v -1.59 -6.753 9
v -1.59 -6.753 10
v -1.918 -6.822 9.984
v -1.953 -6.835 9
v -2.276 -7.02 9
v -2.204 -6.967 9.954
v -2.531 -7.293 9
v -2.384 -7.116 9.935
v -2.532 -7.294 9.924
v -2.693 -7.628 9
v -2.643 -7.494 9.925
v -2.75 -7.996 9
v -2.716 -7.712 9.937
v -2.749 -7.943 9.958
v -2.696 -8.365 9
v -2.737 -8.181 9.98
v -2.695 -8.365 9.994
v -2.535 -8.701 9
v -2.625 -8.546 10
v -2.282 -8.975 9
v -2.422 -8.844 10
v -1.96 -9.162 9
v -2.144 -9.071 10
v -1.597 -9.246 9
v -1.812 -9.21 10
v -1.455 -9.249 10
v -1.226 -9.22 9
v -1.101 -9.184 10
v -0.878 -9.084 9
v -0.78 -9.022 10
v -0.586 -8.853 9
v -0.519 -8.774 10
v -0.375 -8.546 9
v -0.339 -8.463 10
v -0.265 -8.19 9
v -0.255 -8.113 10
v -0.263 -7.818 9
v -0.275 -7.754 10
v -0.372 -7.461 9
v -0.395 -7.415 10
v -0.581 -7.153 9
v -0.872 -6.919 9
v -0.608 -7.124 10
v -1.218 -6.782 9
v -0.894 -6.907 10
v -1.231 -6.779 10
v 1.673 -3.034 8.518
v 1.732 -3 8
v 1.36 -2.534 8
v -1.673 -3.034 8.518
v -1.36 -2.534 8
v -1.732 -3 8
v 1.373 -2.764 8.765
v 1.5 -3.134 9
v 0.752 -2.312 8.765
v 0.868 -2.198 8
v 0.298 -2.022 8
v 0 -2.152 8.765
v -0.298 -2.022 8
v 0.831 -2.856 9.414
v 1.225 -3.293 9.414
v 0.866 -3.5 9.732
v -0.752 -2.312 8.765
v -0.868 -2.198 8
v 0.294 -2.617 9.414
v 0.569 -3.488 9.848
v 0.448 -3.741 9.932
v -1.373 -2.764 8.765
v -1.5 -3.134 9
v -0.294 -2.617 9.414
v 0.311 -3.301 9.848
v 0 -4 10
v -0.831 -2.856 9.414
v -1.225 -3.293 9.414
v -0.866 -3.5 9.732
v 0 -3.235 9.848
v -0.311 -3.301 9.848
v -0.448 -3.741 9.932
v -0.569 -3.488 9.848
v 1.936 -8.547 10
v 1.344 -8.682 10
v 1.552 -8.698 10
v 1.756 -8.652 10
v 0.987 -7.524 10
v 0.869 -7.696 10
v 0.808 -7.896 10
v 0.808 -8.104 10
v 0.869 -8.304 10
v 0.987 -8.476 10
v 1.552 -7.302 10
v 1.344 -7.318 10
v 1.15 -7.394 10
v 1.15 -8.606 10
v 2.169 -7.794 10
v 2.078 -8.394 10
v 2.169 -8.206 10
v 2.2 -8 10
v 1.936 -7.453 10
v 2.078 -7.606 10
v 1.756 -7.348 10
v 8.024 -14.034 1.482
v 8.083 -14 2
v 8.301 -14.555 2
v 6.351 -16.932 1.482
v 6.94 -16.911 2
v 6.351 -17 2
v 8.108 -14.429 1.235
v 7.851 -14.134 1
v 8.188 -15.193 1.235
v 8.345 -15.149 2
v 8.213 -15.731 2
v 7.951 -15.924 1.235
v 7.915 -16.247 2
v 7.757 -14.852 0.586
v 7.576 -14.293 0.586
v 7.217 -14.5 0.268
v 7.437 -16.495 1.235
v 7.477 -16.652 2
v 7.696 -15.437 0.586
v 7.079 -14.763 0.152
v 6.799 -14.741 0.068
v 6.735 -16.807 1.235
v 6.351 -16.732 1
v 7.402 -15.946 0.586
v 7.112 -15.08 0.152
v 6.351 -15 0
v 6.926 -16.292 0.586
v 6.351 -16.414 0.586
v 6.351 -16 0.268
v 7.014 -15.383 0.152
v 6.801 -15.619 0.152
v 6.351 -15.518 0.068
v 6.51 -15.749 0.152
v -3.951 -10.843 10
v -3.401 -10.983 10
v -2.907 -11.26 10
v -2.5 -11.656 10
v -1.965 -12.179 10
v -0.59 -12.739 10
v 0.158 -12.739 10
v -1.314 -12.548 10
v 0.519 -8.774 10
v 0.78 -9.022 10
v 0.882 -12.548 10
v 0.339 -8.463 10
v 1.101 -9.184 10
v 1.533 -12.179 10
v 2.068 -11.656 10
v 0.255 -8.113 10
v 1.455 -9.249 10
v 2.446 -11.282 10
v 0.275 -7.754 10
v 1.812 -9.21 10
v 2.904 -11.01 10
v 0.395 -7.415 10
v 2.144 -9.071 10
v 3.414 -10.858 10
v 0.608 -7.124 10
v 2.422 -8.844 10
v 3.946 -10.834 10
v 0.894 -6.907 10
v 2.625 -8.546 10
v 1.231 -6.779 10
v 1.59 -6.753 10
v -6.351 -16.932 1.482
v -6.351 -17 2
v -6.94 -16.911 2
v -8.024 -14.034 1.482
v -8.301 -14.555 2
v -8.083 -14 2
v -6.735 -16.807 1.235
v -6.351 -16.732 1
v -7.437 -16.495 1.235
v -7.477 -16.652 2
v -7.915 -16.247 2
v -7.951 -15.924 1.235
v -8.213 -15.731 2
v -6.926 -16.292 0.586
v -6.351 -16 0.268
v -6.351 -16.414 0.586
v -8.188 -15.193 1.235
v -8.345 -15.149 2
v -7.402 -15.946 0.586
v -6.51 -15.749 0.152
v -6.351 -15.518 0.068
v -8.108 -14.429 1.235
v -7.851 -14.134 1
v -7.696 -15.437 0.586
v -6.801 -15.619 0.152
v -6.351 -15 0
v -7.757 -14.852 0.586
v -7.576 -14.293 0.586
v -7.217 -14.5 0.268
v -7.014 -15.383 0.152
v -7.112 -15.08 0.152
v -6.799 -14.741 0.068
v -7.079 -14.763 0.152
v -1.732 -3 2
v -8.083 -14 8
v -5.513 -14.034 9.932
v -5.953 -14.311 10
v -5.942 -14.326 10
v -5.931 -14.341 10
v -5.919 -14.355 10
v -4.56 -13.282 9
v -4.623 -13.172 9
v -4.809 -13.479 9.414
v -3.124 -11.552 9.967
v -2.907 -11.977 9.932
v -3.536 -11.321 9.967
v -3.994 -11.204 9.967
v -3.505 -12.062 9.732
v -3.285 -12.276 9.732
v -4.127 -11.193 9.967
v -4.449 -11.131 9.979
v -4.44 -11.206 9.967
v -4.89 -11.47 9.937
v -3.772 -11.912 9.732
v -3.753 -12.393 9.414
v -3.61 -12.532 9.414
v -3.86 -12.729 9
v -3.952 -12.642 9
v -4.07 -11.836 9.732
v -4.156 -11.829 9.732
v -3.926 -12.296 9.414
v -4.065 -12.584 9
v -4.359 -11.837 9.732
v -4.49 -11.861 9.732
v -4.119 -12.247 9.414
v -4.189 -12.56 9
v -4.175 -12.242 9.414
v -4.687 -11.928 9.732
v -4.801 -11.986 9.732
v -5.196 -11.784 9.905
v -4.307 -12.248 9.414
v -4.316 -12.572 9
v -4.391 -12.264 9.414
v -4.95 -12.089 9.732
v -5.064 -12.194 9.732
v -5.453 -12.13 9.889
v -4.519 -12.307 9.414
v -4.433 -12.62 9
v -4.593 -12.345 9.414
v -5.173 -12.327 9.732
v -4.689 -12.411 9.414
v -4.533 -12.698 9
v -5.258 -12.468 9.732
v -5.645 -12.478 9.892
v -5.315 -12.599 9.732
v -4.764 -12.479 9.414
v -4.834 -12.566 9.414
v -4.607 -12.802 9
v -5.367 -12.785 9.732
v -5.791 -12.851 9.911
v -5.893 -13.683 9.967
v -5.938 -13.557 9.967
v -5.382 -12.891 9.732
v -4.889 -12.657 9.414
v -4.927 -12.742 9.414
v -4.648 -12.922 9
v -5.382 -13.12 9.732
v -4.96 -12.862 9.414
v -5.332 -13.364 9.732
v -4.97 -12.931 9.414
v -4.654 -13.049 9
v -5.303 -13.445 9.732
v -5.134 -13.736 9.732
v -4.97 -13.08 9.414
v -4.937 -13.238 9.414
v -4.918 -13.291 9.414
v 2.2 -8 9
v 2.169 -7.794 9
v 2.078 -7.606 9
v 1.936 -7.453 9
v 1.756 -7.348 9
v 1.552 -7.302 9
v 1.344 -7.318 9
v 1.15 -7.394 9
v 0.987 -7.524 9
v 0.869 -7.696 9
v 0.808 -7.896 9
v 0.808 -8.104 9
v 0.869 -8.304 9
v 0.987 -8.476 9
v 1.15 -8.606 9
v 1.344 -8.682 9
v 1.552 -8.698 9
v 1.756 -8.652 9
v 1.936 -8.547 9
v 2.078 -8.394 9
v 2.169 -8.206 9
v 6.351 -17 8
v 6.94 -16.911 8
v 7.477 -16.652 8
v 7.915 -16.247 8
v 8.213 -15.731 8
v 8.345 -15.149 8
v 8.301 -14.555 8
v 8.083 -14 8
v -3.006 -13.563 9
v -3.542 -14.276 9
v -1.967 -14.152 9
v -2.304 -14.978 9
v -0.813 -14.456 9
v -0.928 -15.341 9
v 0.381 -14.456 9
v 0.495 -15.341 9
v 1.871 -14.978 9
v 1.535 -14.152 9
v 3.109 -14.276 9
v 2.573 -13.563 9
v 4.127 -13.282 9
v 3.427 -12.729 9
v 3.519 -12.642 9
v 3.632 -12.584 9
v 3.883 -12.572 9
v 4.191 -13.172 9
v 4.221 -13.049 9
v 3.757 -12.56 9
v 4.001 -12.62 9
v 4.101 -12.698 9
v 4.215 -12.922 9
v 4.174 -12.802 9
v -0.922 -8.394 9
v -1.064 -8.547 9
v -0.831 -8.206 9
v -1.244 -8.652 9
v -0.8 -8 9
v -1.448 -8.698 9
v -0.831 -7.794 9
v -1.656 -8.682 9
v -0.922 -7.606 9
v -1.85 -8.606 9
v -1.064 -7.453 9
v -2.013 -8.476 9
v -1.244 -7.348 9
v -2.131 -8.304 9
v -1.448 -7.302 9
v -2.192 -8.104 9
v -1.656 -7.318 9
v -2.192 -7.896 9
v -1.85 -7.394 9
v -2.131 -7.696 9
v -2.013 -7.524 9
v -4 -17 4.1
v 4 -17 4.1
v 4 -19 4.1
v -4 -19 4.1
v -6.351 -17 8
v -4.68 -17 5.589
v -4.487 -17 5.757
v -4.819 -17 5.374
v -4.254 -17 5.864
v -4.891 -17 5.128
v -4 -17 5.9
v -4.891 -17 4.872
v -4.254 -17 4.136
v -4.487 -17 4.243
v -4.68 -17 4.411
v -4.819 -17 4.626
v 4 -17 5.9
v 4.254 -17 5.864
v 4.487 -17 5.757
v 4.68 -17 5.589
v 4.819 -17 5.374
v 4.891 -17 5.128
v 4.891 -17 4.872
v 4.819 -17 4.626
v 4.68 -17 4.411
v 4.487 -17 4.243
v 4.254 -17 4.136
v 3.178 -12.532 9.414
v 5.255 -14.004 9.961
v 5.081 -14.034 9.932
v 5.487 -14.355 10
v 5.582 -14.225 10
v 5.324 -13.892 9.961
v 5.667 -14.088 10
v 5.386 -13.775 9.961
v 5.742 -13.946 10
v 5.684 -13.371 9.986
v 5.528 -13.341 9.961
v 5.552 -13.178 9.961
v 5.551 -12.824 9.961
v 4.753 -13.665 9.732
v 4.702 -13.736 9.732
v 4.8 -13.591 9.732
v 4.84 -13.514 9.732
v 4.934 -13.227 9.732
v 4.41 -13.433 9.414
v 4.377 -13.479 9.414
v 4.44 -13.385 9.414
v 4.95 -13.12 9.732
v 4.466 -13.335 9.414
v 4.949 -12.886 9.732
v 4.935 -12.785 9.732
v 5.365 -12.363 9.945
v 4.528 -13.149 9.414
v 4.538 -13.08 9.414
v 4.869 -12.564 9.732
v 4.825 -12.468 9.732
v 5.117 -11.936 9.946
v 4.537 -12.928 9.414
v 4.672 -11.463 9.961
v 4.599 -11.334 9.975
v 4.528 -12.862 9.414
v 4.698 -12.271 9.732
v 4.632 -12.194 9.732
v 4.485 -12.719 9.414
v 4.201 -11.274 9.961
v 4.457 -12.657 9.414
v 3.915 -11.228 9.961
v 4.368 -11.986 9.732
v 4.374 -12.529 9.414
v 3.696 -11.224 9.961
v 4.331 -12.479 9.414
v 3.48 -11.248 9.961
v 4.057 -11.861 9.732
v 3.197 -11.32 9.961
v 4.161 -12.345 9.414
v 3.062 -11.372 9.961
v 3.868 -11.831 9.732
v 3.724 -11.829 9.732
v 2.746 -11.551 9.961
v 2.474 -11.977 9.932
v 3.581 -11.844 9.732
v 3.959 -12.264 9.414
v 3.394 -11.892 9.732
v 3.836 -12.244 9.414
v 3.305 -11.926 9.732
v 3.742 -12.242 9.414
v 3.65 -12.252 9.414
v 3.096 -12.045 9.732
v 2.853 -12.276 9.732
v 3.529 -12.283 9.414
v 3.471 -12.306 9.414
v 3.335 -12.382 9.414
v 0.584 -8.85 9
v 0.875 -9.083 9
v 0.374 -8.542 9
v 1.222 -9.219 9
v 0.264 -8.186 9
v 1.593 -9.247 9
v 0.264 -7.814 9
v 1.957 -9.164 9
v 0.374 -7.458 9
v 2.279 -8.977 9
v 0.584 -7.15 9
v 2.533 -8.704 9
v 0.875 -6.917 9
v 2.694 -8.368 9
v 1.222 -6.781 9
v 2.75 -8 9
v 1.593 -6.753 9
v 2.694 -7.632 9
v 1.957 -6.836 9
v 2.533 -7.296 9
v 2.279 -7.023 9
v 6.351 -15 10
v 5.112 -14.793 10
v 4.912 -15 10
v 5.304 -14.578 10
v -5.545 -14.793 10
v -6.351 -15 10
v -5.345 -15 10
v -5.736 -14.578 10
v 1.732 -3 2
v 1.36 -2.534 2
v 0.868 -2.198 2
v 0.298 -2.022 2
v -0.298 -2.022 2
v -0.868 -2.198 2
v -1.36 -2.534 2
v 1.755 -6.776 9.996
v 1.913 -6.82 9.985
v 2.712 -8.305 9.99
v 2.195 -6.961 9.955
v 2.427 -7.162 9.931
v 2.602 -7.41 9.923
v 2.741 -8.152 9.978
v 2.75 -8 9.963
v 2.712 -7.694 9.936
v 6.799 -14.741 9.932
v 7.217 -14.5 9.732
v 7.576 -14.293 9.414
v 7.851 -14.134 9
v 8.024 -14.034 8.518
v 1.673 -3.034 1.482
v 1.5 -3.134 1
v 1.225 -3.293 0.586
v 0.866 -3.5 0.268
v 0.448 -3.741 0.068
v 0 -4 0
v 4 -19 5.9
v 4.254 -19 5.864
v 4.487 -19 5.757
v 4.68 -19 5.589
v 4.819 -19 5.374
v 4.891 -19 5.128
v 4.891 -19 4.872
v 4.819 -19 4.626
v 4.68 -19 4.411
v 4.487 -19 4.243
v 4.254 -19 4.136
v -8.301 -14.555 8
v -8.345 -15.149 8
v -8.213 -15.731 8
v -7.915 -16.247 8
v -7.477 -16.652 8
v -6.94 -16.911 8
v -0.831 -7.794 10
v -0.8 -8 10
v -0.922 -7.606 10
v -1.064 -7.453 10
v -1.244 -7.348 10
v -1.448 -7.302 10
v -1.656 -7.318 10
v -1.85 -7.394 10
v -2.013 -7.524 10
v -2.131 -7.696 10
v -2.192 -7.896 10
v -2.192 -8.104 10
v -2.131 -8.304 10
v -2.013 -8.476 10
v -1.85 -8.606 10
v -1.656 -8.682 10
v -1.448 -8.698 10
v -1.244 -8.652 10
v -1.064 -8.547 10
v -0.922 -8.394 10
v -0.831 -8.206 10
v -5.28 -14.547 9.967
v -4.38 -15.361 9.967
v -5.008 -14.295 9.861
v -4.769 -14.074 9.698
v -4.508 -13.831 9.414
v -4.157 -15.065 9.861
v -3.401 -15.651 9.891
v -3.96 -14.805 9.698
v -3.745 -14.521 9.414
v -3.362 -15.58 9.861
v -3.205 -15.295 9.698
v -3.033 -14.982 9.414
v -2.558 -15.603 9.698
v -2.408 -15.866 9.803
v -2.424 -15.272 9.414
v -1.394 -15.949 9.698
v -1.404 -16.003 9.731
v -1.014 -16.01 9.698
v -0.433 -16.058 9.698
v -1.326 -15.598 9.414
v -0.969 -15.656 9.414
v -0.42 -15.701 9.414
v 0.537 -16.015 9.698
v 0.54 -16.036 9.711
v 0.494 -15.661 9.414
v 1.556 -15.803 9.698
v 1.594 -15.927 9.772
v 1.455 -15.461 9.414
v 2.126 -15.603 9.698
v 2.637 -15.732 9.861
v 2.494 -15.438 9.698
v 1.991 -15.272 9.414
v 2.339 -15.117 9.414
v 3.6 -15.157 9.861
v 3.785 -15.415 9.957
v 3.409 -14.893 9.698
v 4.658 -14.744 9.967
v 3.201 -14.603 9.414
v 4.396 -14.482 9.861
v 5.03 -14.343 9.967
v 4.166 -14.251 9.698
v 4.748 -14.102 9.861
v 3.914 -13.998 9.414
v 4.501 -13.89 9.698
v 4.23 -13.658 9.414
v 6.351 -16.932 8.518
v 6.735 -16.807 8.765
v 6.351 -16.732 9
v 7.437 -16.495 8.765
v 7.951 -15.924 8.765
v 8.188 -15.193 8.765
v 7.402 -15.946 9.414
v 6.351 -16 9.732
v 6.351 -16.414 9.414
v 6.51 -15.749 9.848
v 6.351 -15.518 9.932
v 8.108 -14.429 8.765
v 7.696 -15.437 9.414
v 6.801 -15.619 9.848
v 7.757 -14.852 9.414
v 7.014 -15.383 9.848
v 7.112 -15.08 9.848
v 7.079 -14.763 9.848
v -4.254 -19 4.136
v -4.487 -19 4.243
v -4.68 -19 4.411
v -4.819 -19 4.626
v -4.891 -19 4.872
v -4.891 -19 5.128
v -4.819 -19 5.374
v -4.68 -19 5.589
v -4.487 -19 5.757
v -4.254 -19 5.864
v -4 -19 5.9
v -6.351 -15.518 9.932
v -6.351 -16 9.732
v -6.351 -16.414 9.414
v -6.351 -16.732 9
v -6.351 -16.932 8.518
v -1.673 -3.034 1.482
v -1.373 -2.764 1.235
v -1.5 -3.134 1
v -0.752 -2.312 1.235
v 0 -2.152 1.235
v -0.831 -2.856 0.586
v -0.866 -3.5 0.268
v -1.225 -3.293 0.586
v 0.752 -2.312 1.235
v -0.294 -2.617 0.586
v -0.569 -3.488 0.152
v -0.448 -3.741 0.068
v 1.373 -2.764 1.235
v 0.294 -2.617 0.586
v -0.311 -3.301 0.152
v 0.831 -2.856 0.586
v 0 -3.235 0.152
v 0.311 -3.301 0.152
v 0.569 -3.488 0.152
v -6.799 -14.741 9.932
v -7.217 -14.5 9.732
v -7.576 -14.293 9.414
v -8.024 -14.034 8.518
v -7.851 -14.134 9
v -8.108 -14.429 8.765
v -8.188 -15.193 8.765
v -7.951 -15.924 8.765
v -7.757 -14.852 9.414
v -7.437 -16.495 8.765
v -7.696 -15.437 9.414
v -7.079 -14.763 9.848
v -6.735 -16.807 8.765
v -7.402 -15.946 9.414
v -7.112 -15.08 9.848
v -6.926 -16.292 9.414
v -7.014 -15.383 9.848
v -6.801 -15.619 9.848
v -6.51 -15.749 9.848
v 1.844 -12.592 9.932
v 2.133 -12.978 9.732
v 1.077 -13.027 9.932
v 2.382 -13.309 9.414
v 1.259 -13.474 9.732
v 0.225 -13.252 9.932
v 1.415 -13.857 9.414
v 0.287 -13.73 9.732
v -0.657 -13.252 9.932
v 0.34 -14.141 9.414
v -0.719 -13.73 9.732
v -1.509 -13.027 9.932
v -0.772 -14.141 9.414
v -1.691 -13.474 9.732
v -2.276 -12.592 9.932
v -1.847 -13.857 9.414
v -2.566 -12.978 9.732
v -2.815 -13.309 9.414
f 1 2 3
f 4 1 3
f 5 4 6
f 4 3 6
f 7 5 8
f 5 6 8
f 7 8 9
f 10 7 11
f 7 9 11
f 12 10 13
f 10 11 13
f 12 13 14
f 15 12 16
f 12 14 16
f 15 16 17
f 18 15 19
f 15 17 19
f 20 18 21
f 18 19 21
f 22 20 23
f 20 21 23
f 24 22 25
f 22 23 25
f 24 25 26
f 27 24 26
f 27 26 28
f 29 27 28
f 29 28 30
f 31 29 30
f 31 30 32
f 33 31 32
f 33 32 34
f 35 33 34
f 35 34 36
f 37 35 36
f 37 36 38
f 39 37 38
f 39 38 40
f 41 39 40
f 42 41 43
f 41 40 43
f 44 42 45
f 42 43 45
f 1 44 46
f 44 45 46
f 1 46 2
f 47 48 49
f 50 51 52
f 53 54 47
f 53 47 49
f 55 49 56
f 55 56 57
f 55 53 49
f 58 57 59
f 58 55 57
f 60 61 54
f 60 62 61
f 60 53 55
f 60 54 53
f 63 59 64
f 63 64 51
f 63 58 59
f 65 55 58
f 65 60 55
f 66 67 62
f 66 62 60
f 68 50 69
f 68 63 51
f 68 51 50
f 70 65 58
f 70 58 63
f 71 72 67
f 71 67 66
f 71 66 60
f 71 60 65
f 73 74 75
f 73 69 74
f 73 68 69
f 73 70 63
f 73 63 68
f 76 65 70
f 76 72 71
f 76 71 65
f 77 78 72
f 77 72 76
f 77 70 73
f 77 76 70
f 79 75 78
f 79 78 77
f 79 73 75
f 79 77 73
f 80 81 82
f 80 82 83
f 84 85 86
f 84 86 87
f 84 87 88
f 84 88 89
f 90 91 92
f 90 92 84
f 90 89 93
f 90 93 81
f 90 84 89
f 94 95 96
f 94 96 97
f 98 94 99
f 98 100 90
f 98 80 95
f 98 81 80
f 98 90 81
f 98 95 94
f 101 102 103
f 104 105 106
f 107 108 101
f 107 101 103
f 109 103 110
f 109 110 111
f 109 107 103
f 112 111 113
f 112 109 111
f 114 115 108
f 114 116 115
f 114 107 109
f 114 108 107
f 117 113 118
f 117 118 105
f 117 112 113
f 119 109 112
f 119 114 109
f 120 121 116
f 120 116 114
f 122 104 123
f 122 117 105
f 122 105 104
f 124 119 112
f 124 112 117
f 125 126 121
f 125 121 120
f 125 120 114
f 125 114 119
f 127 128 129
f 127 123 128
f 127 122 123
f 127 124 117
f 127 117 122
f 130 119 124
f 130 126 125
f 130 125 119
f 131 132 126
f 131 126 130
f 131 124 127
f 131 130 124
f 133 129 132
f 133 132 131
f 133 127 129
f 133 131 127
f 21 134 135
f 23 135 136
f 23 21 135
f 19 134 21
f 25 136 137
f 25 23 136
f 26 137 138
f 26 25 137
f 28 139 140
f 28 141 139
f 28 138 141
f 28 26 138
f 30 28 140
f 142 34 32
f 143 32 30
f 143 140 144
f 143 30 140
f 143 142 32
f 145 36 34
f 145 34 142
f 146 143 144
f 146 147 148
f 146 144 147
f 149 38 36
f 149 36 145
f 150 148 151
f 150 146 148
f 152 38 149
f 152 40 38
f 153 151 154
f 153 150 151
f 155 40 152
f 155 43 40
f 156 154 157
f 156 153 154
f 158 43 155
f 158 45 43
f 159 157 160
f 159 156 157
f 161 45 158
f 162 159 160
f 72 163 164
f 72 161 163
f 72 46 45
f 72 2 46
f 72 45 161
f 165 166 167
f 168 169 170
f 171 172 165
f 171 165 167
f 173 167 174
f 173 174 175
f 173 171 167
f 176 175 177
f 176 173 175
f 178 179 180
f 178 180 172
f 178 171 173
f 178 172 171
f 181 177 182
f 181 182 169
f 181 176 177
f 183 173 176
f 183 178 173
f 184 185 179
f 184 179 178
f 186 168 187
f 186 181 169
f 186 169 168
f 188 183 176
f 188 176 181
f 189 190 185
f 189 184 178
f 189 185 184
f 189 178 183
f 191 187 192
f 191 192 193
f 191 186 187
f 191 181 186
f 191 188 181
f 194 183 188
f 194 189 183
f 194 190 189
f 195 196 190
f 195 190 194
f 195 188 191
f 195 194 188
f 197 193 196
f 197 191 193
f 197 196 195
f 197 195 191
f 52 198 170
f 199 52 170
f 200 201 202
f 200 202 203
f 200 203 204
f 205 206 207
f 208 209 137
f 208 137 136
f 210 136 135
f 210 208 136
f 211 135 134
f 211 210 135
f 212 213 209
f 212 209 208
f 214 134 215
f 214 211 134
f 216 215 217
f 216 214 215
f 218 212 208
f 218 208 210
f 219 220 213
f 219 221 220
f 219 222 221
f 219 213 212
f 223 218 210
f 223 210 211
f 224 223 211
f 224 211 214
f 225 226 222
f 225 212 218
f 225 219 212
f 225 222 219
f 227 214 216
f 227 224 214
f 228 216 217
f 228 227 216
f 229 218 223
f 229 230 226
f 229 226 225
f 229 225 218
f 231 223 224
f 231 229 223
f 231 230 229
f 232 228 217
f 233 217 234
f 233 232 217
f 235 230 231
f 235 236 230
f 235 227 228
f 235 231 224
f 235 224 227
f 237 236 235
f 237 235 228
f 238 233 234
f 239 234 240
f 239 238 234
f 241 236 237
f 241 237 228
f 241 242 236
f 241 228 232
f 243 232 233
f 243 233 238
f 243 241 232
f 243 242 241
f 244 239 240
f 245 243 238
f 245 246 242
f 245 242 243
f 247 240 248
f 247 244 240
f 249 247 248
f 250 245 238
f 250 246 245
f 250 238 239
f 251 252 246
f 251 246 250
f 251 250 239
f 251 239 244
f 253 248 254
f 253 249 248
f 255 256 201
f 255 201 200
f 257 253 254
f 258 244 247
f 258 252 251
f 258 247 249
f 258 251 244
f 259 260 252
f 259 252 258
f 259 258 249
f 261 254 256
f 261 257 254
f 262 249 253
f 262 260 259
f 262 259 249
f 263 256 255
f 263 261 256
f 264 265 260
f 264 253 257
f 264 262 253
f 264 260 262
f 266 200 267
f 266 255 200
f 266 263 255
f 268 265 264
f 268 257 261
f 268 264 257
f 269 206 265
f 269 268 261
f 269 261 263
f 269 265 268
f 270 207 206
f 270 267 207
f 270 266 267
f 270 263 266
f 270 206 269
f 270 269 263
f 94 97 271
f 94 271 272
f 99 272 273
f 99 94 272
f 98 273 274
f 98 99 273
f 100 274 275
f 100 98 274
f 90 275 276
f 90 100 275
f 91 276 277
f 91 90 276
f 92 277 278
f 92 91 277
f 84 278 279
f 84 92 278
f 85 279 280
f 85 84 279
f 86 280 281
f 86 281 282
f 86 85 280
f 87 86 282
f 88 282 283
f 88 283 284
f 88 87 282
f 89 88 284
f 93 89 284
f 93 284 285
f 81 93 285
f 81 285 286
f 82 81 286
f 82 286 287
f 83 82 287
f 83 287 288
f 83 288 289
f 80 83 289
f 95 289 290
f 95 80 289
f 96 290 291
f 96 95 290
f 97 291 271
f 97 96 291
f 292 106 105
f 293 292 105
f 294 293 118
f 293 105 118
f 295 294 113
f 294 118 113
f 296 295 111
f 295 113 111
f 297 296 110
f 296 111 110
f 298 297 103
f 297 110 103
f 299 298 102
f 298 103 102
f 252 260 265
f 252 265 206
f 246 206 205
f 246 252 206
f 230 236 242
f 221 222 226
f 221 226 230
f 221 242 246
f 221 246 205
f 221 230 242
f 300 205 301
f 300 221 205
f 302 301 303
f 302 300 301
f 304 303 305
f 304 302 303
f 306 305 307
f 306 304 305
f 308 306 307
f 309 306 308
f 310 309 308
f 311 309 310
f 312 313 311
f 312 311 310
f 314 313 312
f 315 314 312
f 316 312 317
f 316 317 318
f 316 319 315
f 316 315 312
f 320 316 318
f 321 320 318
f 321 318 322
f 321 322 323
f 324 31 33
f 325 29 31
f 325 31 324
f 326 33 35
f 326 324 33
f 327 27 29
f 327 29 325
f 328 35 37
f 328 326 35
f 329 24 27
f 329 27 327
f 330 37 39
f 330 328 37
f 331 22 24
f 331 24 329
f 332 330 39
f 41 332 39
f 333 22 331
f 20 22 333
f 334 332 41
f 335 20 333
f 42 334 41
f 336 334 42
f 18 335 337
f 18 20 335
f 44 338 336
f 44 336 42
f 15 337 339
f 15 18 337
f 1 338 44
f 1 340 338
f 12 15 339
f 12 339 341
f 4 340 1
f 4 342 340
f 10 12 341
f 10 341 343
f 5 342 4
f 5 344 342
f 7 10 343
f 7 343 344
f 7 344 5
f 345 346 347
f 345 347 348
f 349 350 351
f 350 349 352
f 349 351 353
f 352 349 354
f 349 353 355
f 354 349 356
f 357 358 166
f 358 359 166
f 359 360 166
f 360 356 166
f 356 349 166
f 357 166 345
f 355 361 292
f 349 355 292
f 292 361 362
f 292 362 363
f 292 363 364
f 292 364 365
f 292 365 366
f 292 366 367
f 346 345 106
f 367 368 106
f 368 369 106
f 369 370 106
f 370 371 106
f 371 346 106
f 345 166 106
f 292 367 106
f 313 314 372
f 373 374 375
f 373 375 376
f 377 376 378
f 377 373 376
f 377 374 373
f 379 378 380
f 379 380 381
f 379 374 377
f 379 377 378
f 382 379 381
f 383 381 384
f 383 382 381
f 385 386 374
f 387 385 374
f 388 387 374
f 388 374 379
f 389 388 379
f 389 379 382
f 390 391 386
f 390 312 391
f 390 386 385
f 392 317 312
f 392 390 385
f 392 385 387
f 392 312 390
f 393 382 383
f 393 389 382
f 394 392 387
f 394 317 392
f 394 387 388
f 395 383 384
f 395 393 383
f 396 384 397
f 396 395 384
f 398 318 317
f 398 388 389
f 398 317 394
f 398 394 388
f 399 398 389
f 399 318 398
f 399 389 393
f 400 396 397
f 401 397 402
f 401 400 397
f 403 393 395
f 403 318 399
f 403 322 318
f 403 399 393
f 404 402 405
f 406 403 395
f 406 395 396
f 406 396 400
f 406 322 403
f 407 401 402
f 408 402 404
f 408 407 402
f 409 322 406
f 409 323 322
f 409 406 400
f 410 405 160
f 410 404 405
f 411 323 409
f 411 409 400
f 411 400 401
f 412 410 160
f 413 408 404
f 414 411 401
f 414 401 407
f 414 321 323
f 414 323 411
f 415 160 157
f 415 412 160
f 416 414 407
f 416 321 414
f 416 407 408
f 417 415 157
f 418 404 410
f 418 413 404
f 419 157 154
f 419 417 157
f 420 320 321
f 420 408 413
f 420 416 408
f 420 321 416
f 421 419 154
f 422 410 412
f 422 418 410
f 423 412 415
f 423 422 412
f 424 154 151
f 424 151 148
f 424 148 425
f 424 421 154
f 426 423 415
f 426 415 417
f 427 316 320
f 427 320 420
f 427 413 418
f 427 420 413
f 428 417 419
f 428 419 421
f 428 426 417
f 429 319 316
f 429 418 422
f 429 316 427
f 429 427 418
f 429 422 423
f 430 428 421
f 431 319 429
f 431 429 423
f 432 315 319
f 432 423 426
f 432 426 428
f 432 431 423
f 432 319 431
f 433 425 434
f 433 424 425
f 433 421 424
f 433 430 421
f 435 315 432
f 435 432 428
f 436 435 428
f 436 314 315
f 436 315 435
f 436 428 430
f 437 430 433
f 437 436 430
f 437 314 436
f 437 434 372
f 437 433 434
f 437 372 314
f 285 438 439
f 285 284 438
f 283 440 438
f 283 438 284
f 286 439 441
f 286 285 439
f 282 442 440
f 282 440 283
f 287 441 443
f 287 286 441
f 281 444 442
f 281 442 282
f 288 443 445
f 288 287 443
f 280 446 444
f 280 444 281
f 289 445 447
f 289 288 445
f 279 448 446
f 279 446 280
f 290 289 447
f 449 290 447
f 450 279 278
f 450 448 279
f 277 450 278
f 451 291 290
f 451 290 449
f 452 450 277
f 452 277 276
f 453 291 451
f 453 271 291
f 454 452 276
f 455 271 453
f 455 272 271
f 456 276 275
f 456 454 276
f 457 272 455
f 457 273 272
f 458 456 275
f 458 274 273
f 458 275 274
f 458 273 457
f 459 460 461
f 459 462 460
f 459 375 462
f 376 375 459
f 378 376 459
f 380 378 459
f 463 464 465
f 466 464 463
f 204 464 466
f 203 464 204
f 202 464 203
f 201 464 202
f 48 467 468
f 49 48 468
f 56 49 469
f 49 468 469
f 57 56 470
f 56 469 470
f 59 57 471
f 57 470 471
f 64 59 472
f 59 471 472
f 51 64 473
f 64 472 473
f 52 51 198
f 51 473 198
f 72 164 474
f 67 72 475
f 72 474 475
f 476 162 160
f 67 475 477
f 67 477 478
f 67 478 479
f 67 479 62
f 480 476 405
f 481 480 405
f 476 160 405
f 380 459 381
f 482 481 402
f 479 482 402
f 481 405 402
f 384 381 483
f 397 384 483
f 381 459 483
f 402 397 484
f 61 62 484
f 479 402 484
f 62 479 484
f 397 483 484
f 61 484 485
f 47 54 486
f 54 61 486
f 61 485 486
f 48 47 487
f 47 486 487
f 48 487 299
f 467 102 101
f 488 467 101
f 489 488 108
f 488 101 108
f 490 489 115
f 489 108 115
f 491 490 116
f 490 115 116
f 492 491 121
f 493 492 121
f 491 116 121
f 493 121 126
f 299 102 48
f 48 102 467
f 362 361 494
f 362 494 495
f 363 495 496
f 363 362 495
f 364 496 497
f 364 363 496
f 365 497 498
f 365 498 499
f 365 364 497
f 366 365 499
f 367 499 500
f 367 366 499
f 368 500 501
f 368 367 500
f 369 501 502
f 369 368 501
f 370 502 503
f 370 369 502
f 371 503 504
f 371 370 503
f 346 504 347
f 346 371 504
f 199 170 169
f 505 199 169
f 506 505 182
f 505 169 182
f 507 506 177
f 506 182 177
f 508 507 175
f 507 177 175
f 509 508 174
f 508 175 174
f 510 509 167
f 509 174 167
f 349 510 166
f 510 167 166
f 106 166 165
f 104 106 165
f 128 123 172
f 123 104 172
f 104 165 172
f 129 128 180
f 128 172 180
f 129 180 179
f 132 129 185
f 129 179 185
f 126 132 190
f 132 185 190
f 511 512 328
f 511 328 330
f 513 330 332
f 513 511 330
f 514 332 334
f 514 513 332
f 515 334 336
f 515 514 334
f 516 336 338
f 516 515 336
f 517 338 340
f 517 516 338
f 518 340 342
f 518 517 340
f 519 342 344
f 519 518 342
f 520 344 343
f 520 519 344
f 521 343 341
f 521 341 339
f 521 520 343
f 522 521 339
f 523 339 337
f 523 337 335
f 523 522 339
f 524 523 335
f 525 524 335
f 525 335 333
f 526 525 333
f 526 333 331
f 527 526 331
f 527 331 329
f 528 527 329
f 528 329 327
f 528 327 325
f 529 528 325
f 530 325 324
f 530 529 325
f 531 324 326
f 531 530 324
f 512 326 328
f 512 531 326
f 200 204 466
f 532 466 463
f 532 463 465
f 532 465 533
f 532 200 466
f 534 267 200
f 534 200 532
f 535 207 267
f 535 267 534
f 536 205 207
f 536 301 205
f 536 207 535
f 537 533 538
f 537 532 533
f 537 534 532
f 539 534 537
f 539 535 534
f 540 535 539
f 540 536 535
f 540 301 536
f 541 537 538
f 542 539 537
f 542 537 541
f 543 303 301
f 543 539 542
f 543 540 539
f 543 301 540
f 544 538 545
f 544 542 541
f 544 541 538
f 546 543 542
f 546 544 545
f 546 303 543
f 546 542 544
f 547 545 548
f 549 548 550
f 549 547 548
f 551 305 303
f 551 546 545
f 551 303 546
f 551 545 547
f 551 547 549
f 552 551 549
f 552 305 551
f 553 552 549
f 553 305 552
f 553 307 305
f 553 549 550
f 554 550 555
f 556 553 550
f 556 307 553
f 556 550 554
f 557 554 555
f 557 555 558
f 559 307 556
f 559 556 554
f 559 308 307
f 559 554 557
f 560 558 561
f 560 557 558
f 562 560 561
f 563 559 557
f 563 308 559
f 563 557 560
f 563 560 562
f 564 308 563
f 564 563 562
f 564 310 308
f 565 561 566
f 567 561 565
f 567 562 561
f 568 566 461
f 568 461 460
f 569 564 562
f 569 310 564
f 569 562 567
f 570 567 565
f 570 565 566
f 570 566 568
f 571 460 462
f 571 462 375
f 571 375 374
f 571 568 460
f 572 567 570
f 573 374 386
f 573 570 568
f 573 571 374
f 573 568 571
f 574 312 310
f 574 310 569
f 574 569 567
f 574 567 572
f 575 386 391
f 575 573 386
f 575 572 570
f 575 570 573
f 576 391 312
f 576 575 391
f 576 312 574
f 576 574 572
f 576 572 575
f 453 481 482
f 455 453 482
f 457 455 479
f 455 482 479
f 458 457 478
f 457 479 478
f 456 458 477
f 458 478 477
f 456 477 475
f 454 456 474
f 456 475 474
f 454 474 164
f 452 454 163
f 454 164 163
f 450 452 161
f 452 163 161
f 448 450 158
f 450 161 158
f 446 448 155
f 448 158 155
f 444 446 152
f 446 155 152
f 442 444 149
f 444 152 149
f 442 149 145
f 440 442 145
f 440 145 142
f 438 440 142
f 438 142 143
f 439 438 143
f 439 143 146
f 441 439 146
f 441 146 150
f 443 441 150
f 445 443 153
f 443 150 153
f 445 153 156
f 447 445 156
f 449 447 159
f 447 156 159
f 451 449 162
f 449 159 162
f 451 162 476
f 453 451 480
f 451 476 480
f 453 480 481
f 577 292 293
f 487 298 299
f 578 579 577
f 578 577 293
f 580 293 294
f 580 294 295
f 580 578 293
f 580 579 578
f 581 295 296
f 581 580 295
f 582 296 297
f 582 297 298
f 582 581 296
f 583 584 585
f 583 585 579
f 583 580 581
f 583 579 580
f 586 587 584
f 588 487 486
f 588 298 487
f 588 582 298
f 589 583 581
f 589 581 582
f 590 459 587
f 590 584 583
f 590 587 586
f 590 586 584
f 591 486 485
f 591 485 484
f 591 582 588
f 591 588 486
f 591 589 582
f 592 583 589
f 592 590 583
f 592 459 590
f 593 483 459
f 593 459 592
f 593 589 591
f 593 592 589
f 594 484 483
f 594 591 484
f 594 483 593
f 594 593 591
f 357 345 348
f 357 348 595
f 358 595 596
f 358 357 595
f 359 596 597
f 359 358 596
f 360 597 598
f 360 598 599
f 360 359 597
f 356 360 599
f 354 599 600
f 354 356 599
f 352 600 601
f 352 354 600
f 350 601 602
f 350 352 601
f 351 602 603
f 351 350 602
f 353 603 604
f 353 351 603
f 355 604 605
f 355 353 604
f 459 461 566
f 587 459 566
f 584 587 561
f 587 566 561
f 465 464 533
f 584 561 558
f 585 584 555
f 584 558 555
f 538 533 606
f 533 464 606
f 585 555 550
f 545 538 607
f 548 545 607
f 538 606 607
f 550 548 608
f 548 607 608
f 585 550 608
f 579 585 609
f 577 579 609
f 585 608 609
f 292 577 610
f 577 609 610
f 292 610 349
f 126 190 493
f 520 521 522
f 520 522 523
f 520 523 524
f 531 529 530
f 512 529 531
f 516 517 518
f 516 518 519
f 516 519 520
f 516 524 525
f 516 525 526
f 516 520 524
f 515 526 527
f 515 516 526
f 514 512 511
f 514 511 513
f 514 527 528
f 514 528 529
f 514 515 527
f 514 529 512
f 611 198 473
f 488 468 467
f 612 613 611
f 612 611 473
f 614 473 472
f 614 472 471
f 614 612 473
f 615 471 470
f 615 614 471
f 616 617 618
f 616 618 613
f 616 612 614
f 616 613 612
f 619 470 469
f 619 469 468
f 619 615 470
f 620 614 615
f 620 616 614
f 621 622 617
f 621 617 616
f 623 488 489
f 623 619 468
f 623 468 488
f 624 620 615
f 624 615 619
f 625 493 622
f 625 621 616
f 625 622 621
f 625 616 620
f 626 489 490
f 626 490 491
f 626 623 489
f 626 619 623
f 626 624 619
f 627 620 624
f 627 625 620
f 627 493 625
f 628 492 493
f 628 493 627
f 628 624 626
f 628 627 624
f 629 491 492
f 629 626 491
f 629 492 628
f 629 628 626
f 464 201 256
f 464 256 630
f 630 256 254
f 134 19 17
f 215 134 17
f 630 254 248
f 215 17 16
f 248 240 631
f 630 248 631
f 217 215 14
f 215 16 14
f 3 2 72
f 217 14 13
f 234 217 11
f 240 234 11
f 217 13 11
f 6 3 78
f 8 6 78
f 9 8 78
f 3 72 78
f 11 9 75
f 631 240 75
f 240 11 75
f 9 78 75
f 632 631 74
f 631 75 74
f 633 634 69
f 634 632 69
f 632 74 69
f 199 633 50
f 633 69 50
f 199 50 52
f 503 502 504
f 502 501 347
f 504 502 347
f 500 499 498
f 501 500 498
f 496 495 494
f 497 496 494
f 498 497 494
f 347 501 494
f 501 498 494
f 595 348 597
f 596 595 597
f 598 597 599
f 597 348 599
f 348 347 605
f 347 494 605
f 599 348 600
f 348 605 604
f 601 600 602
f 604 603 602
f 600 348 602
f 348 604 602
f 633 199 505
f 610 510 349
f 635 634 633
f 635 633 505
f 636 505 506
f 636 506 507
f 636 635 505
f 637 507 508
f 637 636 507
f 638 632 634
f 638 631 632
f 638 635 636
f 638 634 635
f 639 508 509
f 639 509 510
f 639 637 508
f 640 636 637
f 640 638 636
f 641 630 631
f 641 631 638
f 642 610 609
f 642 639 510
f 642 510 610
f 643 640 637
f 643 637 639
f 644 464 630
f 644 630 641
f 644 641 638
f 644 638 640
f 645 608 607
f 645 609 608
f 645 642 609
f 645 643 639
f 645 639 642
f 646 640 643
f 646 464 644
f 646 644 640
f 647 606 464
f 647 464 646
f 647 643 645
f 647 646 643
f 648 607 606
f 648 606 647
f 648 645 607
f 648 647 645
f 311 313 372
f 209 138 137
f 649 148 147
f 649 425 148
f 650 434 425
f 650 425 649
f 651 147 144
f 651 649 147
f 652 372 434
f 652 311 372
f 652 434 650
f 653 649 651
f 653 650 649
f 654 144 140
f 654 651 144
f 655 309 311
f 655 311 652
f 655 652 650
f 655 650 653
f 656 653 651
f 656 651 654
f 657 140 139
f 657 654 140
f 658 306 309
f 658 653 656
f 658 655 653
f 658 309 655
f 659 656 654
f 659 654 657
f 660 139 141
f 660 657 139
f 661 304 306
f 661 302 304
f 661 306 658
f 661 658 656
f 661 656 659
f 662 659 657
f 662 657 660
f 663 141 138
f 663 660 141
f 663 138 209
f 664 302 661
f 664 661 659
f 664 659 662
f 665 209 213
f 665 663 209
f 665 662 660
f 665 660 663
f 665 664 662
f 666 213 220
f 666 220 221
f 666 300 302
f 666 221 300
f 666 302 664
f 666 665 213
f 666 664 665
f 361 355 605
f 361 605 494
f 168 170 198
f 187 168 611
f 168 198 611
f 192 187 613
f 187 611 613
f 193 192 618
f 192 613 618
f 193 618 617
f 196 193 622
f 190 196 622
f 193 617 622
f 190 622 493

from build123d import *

# Parameters (mm, degrees)
BOSS_EXTRUDE1_DEPTH = 10
CUT_EXTRUDE1_DEPTH  = 1
FILLET1_R           = 2
SKETCH3_R           = 1.25
SKETCH3_R_2         = 0.7
CUT_EXTRUDE2_DEPTH  = 1
BOSS_EXTRUDE2_DEPTH = 2


with BuildPart() as part:
    # Sketch1 → Boss-Extrude1 (new body)
    with BuildSketch(Plane.XY):
        Polygon((-9.814954576, -17), (9.814954576, -17), (0, 0), align=None)
    extrude(amount=BOSS_EXTRUDE1_DEPTH)

    # Sketch2 → Cut-Extrude1 (cut)
    with BuildSketch(Plane.XY.offset(10)):
        with BuildLine():
            ThreePointArc((-4.55976672, -13.28190161), (-0.216174522, -15.38675653), (4.127417675, -13.28190161))
            ThreePointArc((4.127417675, -13.28190161), (4.053734797, -12.655479816), (3.427313004, -12.729162694))
            ThreePointArc((3.427313004, -12.729162694), (-0.216174522, -14.494754927), (-3.859662049, -12.729162694))
            ThreePointArc((-3.859662049, -12.729162694), (-4.486083842, -12.655479816), (-4.55976672, -13.28190161))
        make_face()
    extrude(amount=-CUT_EXTRUDE1_DEPTH, mode=Mode.SUBTRACT)

    # Fillet1
    # the kernel refuses this fillet: 2 mm, written as the material it takes off along each edge
    with BuildSketch(Plane(origin=(6.350852961, -15, 2), x_dir=(0, -1, 0), z_dir=(0, 0, -1))) as fillet1_piece_1_section:
        Polygon((0, 0), (FILLET1_R * 1.02, 0), (FILLET1_R * 1.02, -FILLET1_R * 1.76669182372), (-FILLET1_R * 0.51, -FILLET1_R * 0.88334591186), align=None)
    fillet1_piece_1 = extrude(amount=FILLET1_R * 1.02, mode=Mode.PRIVATE)
    fillet1_piece_1 = fillet1_piece_1 - Plane(origin=(6.350852961, -15, 2), x_dir=(-0.8660254037844387, 0.4999999999999999, 0), z_dir=(0, 0, -1)) * Sphere(FILLET1_R, mode=Mode.PRIVATE)
    add(fillet1_piece_1, mode=Mode.SUBTRACT)
    with BuildSketch(Plane(origin=(6.350852961, -15, 8), x_dir=(0, -1, 0), z_dir=(0, 0, 1))) as fillet1_piece_2_section:
        Polygon((0, 0), (FILLET1_R * 1.02, 0), (FILLET1_R * 1.02, FILLET1_R * 1.76669182372), (-FILLET1_R * 0.51, FILLET1_R * 0.88334591186), align=None)
    fillet1_piece_2 = extrude(amount=FILLET1_R * 1.02, mode=Mode.PRIVATE)
    fillet1_piece_2 = fillet1_piece_2 - Plane(origin=(6.350852961, -15, 8), x_dir=(-0.8660254037844387, 0.4999999999999999, 0), z_dir=(0, 0, 1)) * Sphere(FILLET1_R, mode=Mode.PRIVATE)
    add(fillet1_piece_2, mode=Mode.SUBTRACT)
    with BuildSketch(Plane(origin=(0, -4, 2), x_dir=(-0.8660254037844387, 0.5000000000000001, 0), z_dir=(0, 0, -1))) as fillet1_piece_3_section:
        Polygon((0, 0), (FILLET1_R * 1.02, 0), (FILLET1_R * 1.02, FILLET1_R * 1.76669182372), (-FILLET1_R * 0.51, FILLET1_R * 0.88334591186), align=None)
    fillet1_piece_3 = extrude(amount=FILLET1_R * 1.02, mode=Mode.PRIVATE)
    fillet1_piece_3 = fillet1_piece_3 - Plane(origin=(0, -4, 2), x_dir=(0, -1, 0), z_dir=(0, 0, -1)) * Sphere(FILLET1_R, mode=Mode.PRIVATE)
    add(fillet1_piece_3, mode=Mode.SUBTRACT)
    with BuildSketch(Plane(origin=(0, -4, 8), x_dir=(-0.8660254037844387, 0.5000000000000001, 0), z_dir=(0, 0, 1))) as fillet1_piece_4_section:
        Polygon((0, 0), (FILLET1_R * 1.02, 0), (FILLET1_R * 1.02, -FILLET1_R * 1.76669182372), (-FILLET1_R * 0.51, -FILLET1_R * 0.88334591186), align=None)
    fillet1_piece_4 = extrude(amount=FILLET1_R * 1.02, mode=Mode.PRIVATE)
    fillet1_piece_4 = fillet1_piece_4 - Plane(origin=(0, -4, 8), x_dir=(0, -1, 0), z_dir=(0, 0, 1)) * Sphere(FILLET1_R, mode=Mode.PRIVATE)
    add(fillet1_piece_4, mode=Mode.SUBTRACT)
    with BuildSketch(Plane(origin=(-6.350852961, -15, 8), x_dir=(0, -1, 0), z_dir=(0, 0, 1))) as fillet1_piece_5_section:
        Polygon((0, 0), (FILLET1_R * 1.02, 0), (FILLET1_R * 1.02, -FILLET1_R * 1.76669182372), (-FILLET1_R * 0.51, -FILLET1_R * 0.88334591186), align=None)
    fillet1_piece_5 = extrude(amount=FILLET1_R * 1.02, mode=Mode.PRIVATE)
    fillet1_piece_5 = fillet1_piece_5 - Plane(origin=(-6.350852961, -15, 8), x_dir=(0.8660254037844387, 0.4999999999999999, 0), z_dir=(0, 0, 1)) * Sphere(FILLET1_R, mode=Mode.PRIVATE)
    add(fillet1_piece_5, mode=Mode.SUBTRACT)
    with BuildSketch(Plane(origin=(-6.350852961, -15, 2), x_dir=(0, -1, 0), z_dir=(0, 0, -1))) as fillet1_piece_6_section:
        Polygon((0, 0), (FILLET1_R * 1.02, 0), (FILLET1_R * 1.02, FILLET1_R * 1.76669182372), (-FILLET1_R * 0.51, FILLET1_R * 0.88334591186), align=None)
    fillet1_piece_6 = extrude(amount=FILLET1_R * 1.02, mode=Mode.PRIVATE)
    fillet1_piece_6 = fillet1_piece_6 - Plane(origin=(-6.350852961, -15, 2), x_dir=(0.8660254037844387, 0.4999999999999999, 0), z_dir=(0, 0, -1)) * Sphere(FILLET1_R, mode=Mode.PRIVATE)
    add(fillet1_piece_6, mode=Mode.SUBTRACT)
    with BuildSketch(Plane(origin=(9.814954576, -17, 2), x_dir=(-1, 0, 0), z_dir=(0, 0, 1))) as fillet1_piece_7:
        with BuildLine():
            CenterArc((FILLET1_R * 1.73205080757, -FILLET1_R), FILLET1_R, 90, 120)
            Line((FILLET1_R * 0.866025403784, -FILLET1_R * 1.5), (0, 0))
            Line((0, 0), (FILLET1_R * 1.73205080757, 0))
        make_face()
    extrude(amount=6, mode=Mode.SUBTRACT)
    with BuildSketch(Plane(origin=(0, 0, 2), x_dir=(-0.5000000000000001, -0.8660254037844386, 0), z_dir=(0, 0, 1)), Plane(origin=(-9.814954576, -17, 2), x_dir=(1, 0, 0), z_dir=(0, 0, 1))) as fillet1_piece_8:
        with BuildLine():
            CenterArc((FILLET1_R * 1.73205080757, FILLET1_R), FILLET1_R, 150, 120)
            Line((FILLET1_R * 0.866025403784, FILLET1_R * 1.5), (0, 0))
            Line((0, 0), (FILLET1_R * 1.73205080757, 0))
        make_face()
    extrude(amount=6, mode=Mode.SUBTRACT)
    with BuildSketch(Plane(origin=(8.082903769, -14, 0), x_dir=(0, 0, 1), z_dir=(-0.5000000000000001, 0.8660254037844387, 0)), Plane(origin=(-1.732050808, -3, 0), x_dir=(0, 0, 1), z_dir=(-0.5000000000000001, -0.8660254037844387, 0)), Plane(origin=(-6.350852961, -17, 0), x_dir=(0, 0, 1), z_dir=(1, 0, 0))) as fillet1_piece_9:
        with BuildLine():
            CenterArc((FILLET1_R, -FILLET1_R), FILLET1_R, 90, 90)
            Line((0, -FILLET1_R), (0, 0))
            Line((0, 0), (FILLET1_R, 0))
        make_face()
    extrude(amount=12.701705922, mode=Mode.SUBTRACT)
    with BuildSketch(Plane(origin=(8.082903769, -14, 10), x_dir=(0, 0, -1), z_dir=(-0.5000000000000001, 0.8660254037844387, 0)), Plane(origin=(-6.350852961, -17, 10), x_dir=(0, 0, -1), z_dir=(1, 0, 0)), Plane(origin=(-1.732050808, -3, 10), x_dir=(0, 0, -1), z_dir=(-0.5000000000000001, -0.8660254037844387, 0))) as fillet1_piece_10:
        with BuildLine():
            CenterArc((FILLET1_R, FILLET1_R), FILLET1_R, 180, 90)
            Line((0, FILLET1_R), (0, 0))
            Line((0, 0), (FILLET1_R, 0))
        make_face()
    extrude(amount=12.701705922, mode=Mode.SUBTRACT)
    with BuildSketch(Plane(origin=(-0.216174522, -9.852596625, 10), x_dir=(-0.7848692976014117, -0.6196613475783904, 0), z_dir=(-0.6196613475783904, 0.7848692976014117, 0))) as fillet1_piece_11:
        with BuildLine():
            CenterArc((7.266210713, -2), FILLET1_R, 90, 60)
            Line((5.534159905, -1), (5.534159905, 0))
            Line((5.534159905, 0), (7.266210713, 0))
        make_face()
    revolve(axis=Axis((-0.216174522, -9.852596625, 10), (0, 0, 1)), revolution_arc=103.417183009, mode=Mode.SUBTRACT)
    with BuildSketch(Plane(origin=(3.77736534, -13.005532152, 10), x_dir=(0.7848692976014108, -0.6196613475783915, 0), z_dir=(-0.6196613475783915, -0.7848692976014108, 0))) as fillet1_piece_12:
        with BuildLine():
            CenterArc((2.178051609, -2), FILLET1_R, 90, 60)
            Line((0.446000801, -1), (0.446000801, 0))
            Line((0.446000801, 0), (2.178051609, 0))
        make_face()
    revolve(axis=Axis((3.77736534, -13.005532152, 10), (0, 0, 1)), revolution_arc=180, mode=Mode.SUBTRACT)
    with BuildSketch(Plane(origin=(-0.216174522, -9.852596625, 10), x_dir=(0.7848692976014113, -0.6196613475783908, 0), z_dir=(0.6196613475783908, 0.7848692976014113, 0))) as fillet1_piece_13:
        with BuildLine():
            CenterArc((2.910107495, 2), FILLET1_R, 270, 60)
            Line((4.642158302, 1), (4.642158302, 0))
            Line((4.642158302, 0), (2.910107495, 0))
        make_face()
    revolve(axis=Axis((-0.216174522, -9.852596625, 10), (0, 0, -1)), revolution_arc=103.417183009, mode=Mode.SUBTRACT)
    with BuildSketch(Plane(origin=(-4.209714384, -13.005532152, 10), x_dir=(0.7848692976014146, 0.6196613475783866, 0), z_dir=(0.6196613475783866, -0.7848692976014146, 0))) as fillet1_piece_14:
        with BuildLine():
            CenterArc((2.178051609, -2), FILLET1_R, 90, 60)
            Line((0.446000801, -1), (0.446000801, 0))
            Line((0.446000801, 0), (2.178051609, 0))
        make_face()
    revolve(axis=Axis((-4.209714384, -13.005532152, 10), (0, 0, 1)), revolution_arc=180, mode=Mode.SUBTRACT)

    # Sketch3 → Cut-Extrude2 (cut)
    # profile 1 of 2: a face of its own
    with BuildSketch(Plane.XY.offset(10)):
        with Locations((1.5, -8)):
            Circle(SKETCH3_R)
        with Locations((1.5, -8)):
            Circle(SKETCH3_R_2, mode=Mode.SUBTRACT)
    # profile 2 of 2: a face of its own
    with BuildSketch(Plane.XY.offset(10)):
        with Locations(Location((-1.5, -8, 0), (0, 0, 94.109031583))):
            Circle(SKETCH3_R)
        with Locations((-1.5, -8)):
            Circle(SKETCH3_R_2, mode=Mode.SUBTRACT)
    extrude(amount=-CUT_EXTRUDE2_DEPTH, mode=Mode.SUBTRACT)

    # Sketch4 → Boss-Extrude2 (add)
    with BuildSketch(Plane.XZ.offset(17)):
        with BuildLine():
            Line((-4, 5.9), (4, 5.9))
            ThreePointArc((4, 5.9), (4.9, 5), (4, 4.1))
            Line((4, 4.1), (-4, 4.1))
            ThreePointArc((-4, 4.1), (-4.9, 5), (-4, 5.9))
        make_face()
    extrude(amount=BOSS_EXTRUDE2_DEPTH)


solid = part.part
